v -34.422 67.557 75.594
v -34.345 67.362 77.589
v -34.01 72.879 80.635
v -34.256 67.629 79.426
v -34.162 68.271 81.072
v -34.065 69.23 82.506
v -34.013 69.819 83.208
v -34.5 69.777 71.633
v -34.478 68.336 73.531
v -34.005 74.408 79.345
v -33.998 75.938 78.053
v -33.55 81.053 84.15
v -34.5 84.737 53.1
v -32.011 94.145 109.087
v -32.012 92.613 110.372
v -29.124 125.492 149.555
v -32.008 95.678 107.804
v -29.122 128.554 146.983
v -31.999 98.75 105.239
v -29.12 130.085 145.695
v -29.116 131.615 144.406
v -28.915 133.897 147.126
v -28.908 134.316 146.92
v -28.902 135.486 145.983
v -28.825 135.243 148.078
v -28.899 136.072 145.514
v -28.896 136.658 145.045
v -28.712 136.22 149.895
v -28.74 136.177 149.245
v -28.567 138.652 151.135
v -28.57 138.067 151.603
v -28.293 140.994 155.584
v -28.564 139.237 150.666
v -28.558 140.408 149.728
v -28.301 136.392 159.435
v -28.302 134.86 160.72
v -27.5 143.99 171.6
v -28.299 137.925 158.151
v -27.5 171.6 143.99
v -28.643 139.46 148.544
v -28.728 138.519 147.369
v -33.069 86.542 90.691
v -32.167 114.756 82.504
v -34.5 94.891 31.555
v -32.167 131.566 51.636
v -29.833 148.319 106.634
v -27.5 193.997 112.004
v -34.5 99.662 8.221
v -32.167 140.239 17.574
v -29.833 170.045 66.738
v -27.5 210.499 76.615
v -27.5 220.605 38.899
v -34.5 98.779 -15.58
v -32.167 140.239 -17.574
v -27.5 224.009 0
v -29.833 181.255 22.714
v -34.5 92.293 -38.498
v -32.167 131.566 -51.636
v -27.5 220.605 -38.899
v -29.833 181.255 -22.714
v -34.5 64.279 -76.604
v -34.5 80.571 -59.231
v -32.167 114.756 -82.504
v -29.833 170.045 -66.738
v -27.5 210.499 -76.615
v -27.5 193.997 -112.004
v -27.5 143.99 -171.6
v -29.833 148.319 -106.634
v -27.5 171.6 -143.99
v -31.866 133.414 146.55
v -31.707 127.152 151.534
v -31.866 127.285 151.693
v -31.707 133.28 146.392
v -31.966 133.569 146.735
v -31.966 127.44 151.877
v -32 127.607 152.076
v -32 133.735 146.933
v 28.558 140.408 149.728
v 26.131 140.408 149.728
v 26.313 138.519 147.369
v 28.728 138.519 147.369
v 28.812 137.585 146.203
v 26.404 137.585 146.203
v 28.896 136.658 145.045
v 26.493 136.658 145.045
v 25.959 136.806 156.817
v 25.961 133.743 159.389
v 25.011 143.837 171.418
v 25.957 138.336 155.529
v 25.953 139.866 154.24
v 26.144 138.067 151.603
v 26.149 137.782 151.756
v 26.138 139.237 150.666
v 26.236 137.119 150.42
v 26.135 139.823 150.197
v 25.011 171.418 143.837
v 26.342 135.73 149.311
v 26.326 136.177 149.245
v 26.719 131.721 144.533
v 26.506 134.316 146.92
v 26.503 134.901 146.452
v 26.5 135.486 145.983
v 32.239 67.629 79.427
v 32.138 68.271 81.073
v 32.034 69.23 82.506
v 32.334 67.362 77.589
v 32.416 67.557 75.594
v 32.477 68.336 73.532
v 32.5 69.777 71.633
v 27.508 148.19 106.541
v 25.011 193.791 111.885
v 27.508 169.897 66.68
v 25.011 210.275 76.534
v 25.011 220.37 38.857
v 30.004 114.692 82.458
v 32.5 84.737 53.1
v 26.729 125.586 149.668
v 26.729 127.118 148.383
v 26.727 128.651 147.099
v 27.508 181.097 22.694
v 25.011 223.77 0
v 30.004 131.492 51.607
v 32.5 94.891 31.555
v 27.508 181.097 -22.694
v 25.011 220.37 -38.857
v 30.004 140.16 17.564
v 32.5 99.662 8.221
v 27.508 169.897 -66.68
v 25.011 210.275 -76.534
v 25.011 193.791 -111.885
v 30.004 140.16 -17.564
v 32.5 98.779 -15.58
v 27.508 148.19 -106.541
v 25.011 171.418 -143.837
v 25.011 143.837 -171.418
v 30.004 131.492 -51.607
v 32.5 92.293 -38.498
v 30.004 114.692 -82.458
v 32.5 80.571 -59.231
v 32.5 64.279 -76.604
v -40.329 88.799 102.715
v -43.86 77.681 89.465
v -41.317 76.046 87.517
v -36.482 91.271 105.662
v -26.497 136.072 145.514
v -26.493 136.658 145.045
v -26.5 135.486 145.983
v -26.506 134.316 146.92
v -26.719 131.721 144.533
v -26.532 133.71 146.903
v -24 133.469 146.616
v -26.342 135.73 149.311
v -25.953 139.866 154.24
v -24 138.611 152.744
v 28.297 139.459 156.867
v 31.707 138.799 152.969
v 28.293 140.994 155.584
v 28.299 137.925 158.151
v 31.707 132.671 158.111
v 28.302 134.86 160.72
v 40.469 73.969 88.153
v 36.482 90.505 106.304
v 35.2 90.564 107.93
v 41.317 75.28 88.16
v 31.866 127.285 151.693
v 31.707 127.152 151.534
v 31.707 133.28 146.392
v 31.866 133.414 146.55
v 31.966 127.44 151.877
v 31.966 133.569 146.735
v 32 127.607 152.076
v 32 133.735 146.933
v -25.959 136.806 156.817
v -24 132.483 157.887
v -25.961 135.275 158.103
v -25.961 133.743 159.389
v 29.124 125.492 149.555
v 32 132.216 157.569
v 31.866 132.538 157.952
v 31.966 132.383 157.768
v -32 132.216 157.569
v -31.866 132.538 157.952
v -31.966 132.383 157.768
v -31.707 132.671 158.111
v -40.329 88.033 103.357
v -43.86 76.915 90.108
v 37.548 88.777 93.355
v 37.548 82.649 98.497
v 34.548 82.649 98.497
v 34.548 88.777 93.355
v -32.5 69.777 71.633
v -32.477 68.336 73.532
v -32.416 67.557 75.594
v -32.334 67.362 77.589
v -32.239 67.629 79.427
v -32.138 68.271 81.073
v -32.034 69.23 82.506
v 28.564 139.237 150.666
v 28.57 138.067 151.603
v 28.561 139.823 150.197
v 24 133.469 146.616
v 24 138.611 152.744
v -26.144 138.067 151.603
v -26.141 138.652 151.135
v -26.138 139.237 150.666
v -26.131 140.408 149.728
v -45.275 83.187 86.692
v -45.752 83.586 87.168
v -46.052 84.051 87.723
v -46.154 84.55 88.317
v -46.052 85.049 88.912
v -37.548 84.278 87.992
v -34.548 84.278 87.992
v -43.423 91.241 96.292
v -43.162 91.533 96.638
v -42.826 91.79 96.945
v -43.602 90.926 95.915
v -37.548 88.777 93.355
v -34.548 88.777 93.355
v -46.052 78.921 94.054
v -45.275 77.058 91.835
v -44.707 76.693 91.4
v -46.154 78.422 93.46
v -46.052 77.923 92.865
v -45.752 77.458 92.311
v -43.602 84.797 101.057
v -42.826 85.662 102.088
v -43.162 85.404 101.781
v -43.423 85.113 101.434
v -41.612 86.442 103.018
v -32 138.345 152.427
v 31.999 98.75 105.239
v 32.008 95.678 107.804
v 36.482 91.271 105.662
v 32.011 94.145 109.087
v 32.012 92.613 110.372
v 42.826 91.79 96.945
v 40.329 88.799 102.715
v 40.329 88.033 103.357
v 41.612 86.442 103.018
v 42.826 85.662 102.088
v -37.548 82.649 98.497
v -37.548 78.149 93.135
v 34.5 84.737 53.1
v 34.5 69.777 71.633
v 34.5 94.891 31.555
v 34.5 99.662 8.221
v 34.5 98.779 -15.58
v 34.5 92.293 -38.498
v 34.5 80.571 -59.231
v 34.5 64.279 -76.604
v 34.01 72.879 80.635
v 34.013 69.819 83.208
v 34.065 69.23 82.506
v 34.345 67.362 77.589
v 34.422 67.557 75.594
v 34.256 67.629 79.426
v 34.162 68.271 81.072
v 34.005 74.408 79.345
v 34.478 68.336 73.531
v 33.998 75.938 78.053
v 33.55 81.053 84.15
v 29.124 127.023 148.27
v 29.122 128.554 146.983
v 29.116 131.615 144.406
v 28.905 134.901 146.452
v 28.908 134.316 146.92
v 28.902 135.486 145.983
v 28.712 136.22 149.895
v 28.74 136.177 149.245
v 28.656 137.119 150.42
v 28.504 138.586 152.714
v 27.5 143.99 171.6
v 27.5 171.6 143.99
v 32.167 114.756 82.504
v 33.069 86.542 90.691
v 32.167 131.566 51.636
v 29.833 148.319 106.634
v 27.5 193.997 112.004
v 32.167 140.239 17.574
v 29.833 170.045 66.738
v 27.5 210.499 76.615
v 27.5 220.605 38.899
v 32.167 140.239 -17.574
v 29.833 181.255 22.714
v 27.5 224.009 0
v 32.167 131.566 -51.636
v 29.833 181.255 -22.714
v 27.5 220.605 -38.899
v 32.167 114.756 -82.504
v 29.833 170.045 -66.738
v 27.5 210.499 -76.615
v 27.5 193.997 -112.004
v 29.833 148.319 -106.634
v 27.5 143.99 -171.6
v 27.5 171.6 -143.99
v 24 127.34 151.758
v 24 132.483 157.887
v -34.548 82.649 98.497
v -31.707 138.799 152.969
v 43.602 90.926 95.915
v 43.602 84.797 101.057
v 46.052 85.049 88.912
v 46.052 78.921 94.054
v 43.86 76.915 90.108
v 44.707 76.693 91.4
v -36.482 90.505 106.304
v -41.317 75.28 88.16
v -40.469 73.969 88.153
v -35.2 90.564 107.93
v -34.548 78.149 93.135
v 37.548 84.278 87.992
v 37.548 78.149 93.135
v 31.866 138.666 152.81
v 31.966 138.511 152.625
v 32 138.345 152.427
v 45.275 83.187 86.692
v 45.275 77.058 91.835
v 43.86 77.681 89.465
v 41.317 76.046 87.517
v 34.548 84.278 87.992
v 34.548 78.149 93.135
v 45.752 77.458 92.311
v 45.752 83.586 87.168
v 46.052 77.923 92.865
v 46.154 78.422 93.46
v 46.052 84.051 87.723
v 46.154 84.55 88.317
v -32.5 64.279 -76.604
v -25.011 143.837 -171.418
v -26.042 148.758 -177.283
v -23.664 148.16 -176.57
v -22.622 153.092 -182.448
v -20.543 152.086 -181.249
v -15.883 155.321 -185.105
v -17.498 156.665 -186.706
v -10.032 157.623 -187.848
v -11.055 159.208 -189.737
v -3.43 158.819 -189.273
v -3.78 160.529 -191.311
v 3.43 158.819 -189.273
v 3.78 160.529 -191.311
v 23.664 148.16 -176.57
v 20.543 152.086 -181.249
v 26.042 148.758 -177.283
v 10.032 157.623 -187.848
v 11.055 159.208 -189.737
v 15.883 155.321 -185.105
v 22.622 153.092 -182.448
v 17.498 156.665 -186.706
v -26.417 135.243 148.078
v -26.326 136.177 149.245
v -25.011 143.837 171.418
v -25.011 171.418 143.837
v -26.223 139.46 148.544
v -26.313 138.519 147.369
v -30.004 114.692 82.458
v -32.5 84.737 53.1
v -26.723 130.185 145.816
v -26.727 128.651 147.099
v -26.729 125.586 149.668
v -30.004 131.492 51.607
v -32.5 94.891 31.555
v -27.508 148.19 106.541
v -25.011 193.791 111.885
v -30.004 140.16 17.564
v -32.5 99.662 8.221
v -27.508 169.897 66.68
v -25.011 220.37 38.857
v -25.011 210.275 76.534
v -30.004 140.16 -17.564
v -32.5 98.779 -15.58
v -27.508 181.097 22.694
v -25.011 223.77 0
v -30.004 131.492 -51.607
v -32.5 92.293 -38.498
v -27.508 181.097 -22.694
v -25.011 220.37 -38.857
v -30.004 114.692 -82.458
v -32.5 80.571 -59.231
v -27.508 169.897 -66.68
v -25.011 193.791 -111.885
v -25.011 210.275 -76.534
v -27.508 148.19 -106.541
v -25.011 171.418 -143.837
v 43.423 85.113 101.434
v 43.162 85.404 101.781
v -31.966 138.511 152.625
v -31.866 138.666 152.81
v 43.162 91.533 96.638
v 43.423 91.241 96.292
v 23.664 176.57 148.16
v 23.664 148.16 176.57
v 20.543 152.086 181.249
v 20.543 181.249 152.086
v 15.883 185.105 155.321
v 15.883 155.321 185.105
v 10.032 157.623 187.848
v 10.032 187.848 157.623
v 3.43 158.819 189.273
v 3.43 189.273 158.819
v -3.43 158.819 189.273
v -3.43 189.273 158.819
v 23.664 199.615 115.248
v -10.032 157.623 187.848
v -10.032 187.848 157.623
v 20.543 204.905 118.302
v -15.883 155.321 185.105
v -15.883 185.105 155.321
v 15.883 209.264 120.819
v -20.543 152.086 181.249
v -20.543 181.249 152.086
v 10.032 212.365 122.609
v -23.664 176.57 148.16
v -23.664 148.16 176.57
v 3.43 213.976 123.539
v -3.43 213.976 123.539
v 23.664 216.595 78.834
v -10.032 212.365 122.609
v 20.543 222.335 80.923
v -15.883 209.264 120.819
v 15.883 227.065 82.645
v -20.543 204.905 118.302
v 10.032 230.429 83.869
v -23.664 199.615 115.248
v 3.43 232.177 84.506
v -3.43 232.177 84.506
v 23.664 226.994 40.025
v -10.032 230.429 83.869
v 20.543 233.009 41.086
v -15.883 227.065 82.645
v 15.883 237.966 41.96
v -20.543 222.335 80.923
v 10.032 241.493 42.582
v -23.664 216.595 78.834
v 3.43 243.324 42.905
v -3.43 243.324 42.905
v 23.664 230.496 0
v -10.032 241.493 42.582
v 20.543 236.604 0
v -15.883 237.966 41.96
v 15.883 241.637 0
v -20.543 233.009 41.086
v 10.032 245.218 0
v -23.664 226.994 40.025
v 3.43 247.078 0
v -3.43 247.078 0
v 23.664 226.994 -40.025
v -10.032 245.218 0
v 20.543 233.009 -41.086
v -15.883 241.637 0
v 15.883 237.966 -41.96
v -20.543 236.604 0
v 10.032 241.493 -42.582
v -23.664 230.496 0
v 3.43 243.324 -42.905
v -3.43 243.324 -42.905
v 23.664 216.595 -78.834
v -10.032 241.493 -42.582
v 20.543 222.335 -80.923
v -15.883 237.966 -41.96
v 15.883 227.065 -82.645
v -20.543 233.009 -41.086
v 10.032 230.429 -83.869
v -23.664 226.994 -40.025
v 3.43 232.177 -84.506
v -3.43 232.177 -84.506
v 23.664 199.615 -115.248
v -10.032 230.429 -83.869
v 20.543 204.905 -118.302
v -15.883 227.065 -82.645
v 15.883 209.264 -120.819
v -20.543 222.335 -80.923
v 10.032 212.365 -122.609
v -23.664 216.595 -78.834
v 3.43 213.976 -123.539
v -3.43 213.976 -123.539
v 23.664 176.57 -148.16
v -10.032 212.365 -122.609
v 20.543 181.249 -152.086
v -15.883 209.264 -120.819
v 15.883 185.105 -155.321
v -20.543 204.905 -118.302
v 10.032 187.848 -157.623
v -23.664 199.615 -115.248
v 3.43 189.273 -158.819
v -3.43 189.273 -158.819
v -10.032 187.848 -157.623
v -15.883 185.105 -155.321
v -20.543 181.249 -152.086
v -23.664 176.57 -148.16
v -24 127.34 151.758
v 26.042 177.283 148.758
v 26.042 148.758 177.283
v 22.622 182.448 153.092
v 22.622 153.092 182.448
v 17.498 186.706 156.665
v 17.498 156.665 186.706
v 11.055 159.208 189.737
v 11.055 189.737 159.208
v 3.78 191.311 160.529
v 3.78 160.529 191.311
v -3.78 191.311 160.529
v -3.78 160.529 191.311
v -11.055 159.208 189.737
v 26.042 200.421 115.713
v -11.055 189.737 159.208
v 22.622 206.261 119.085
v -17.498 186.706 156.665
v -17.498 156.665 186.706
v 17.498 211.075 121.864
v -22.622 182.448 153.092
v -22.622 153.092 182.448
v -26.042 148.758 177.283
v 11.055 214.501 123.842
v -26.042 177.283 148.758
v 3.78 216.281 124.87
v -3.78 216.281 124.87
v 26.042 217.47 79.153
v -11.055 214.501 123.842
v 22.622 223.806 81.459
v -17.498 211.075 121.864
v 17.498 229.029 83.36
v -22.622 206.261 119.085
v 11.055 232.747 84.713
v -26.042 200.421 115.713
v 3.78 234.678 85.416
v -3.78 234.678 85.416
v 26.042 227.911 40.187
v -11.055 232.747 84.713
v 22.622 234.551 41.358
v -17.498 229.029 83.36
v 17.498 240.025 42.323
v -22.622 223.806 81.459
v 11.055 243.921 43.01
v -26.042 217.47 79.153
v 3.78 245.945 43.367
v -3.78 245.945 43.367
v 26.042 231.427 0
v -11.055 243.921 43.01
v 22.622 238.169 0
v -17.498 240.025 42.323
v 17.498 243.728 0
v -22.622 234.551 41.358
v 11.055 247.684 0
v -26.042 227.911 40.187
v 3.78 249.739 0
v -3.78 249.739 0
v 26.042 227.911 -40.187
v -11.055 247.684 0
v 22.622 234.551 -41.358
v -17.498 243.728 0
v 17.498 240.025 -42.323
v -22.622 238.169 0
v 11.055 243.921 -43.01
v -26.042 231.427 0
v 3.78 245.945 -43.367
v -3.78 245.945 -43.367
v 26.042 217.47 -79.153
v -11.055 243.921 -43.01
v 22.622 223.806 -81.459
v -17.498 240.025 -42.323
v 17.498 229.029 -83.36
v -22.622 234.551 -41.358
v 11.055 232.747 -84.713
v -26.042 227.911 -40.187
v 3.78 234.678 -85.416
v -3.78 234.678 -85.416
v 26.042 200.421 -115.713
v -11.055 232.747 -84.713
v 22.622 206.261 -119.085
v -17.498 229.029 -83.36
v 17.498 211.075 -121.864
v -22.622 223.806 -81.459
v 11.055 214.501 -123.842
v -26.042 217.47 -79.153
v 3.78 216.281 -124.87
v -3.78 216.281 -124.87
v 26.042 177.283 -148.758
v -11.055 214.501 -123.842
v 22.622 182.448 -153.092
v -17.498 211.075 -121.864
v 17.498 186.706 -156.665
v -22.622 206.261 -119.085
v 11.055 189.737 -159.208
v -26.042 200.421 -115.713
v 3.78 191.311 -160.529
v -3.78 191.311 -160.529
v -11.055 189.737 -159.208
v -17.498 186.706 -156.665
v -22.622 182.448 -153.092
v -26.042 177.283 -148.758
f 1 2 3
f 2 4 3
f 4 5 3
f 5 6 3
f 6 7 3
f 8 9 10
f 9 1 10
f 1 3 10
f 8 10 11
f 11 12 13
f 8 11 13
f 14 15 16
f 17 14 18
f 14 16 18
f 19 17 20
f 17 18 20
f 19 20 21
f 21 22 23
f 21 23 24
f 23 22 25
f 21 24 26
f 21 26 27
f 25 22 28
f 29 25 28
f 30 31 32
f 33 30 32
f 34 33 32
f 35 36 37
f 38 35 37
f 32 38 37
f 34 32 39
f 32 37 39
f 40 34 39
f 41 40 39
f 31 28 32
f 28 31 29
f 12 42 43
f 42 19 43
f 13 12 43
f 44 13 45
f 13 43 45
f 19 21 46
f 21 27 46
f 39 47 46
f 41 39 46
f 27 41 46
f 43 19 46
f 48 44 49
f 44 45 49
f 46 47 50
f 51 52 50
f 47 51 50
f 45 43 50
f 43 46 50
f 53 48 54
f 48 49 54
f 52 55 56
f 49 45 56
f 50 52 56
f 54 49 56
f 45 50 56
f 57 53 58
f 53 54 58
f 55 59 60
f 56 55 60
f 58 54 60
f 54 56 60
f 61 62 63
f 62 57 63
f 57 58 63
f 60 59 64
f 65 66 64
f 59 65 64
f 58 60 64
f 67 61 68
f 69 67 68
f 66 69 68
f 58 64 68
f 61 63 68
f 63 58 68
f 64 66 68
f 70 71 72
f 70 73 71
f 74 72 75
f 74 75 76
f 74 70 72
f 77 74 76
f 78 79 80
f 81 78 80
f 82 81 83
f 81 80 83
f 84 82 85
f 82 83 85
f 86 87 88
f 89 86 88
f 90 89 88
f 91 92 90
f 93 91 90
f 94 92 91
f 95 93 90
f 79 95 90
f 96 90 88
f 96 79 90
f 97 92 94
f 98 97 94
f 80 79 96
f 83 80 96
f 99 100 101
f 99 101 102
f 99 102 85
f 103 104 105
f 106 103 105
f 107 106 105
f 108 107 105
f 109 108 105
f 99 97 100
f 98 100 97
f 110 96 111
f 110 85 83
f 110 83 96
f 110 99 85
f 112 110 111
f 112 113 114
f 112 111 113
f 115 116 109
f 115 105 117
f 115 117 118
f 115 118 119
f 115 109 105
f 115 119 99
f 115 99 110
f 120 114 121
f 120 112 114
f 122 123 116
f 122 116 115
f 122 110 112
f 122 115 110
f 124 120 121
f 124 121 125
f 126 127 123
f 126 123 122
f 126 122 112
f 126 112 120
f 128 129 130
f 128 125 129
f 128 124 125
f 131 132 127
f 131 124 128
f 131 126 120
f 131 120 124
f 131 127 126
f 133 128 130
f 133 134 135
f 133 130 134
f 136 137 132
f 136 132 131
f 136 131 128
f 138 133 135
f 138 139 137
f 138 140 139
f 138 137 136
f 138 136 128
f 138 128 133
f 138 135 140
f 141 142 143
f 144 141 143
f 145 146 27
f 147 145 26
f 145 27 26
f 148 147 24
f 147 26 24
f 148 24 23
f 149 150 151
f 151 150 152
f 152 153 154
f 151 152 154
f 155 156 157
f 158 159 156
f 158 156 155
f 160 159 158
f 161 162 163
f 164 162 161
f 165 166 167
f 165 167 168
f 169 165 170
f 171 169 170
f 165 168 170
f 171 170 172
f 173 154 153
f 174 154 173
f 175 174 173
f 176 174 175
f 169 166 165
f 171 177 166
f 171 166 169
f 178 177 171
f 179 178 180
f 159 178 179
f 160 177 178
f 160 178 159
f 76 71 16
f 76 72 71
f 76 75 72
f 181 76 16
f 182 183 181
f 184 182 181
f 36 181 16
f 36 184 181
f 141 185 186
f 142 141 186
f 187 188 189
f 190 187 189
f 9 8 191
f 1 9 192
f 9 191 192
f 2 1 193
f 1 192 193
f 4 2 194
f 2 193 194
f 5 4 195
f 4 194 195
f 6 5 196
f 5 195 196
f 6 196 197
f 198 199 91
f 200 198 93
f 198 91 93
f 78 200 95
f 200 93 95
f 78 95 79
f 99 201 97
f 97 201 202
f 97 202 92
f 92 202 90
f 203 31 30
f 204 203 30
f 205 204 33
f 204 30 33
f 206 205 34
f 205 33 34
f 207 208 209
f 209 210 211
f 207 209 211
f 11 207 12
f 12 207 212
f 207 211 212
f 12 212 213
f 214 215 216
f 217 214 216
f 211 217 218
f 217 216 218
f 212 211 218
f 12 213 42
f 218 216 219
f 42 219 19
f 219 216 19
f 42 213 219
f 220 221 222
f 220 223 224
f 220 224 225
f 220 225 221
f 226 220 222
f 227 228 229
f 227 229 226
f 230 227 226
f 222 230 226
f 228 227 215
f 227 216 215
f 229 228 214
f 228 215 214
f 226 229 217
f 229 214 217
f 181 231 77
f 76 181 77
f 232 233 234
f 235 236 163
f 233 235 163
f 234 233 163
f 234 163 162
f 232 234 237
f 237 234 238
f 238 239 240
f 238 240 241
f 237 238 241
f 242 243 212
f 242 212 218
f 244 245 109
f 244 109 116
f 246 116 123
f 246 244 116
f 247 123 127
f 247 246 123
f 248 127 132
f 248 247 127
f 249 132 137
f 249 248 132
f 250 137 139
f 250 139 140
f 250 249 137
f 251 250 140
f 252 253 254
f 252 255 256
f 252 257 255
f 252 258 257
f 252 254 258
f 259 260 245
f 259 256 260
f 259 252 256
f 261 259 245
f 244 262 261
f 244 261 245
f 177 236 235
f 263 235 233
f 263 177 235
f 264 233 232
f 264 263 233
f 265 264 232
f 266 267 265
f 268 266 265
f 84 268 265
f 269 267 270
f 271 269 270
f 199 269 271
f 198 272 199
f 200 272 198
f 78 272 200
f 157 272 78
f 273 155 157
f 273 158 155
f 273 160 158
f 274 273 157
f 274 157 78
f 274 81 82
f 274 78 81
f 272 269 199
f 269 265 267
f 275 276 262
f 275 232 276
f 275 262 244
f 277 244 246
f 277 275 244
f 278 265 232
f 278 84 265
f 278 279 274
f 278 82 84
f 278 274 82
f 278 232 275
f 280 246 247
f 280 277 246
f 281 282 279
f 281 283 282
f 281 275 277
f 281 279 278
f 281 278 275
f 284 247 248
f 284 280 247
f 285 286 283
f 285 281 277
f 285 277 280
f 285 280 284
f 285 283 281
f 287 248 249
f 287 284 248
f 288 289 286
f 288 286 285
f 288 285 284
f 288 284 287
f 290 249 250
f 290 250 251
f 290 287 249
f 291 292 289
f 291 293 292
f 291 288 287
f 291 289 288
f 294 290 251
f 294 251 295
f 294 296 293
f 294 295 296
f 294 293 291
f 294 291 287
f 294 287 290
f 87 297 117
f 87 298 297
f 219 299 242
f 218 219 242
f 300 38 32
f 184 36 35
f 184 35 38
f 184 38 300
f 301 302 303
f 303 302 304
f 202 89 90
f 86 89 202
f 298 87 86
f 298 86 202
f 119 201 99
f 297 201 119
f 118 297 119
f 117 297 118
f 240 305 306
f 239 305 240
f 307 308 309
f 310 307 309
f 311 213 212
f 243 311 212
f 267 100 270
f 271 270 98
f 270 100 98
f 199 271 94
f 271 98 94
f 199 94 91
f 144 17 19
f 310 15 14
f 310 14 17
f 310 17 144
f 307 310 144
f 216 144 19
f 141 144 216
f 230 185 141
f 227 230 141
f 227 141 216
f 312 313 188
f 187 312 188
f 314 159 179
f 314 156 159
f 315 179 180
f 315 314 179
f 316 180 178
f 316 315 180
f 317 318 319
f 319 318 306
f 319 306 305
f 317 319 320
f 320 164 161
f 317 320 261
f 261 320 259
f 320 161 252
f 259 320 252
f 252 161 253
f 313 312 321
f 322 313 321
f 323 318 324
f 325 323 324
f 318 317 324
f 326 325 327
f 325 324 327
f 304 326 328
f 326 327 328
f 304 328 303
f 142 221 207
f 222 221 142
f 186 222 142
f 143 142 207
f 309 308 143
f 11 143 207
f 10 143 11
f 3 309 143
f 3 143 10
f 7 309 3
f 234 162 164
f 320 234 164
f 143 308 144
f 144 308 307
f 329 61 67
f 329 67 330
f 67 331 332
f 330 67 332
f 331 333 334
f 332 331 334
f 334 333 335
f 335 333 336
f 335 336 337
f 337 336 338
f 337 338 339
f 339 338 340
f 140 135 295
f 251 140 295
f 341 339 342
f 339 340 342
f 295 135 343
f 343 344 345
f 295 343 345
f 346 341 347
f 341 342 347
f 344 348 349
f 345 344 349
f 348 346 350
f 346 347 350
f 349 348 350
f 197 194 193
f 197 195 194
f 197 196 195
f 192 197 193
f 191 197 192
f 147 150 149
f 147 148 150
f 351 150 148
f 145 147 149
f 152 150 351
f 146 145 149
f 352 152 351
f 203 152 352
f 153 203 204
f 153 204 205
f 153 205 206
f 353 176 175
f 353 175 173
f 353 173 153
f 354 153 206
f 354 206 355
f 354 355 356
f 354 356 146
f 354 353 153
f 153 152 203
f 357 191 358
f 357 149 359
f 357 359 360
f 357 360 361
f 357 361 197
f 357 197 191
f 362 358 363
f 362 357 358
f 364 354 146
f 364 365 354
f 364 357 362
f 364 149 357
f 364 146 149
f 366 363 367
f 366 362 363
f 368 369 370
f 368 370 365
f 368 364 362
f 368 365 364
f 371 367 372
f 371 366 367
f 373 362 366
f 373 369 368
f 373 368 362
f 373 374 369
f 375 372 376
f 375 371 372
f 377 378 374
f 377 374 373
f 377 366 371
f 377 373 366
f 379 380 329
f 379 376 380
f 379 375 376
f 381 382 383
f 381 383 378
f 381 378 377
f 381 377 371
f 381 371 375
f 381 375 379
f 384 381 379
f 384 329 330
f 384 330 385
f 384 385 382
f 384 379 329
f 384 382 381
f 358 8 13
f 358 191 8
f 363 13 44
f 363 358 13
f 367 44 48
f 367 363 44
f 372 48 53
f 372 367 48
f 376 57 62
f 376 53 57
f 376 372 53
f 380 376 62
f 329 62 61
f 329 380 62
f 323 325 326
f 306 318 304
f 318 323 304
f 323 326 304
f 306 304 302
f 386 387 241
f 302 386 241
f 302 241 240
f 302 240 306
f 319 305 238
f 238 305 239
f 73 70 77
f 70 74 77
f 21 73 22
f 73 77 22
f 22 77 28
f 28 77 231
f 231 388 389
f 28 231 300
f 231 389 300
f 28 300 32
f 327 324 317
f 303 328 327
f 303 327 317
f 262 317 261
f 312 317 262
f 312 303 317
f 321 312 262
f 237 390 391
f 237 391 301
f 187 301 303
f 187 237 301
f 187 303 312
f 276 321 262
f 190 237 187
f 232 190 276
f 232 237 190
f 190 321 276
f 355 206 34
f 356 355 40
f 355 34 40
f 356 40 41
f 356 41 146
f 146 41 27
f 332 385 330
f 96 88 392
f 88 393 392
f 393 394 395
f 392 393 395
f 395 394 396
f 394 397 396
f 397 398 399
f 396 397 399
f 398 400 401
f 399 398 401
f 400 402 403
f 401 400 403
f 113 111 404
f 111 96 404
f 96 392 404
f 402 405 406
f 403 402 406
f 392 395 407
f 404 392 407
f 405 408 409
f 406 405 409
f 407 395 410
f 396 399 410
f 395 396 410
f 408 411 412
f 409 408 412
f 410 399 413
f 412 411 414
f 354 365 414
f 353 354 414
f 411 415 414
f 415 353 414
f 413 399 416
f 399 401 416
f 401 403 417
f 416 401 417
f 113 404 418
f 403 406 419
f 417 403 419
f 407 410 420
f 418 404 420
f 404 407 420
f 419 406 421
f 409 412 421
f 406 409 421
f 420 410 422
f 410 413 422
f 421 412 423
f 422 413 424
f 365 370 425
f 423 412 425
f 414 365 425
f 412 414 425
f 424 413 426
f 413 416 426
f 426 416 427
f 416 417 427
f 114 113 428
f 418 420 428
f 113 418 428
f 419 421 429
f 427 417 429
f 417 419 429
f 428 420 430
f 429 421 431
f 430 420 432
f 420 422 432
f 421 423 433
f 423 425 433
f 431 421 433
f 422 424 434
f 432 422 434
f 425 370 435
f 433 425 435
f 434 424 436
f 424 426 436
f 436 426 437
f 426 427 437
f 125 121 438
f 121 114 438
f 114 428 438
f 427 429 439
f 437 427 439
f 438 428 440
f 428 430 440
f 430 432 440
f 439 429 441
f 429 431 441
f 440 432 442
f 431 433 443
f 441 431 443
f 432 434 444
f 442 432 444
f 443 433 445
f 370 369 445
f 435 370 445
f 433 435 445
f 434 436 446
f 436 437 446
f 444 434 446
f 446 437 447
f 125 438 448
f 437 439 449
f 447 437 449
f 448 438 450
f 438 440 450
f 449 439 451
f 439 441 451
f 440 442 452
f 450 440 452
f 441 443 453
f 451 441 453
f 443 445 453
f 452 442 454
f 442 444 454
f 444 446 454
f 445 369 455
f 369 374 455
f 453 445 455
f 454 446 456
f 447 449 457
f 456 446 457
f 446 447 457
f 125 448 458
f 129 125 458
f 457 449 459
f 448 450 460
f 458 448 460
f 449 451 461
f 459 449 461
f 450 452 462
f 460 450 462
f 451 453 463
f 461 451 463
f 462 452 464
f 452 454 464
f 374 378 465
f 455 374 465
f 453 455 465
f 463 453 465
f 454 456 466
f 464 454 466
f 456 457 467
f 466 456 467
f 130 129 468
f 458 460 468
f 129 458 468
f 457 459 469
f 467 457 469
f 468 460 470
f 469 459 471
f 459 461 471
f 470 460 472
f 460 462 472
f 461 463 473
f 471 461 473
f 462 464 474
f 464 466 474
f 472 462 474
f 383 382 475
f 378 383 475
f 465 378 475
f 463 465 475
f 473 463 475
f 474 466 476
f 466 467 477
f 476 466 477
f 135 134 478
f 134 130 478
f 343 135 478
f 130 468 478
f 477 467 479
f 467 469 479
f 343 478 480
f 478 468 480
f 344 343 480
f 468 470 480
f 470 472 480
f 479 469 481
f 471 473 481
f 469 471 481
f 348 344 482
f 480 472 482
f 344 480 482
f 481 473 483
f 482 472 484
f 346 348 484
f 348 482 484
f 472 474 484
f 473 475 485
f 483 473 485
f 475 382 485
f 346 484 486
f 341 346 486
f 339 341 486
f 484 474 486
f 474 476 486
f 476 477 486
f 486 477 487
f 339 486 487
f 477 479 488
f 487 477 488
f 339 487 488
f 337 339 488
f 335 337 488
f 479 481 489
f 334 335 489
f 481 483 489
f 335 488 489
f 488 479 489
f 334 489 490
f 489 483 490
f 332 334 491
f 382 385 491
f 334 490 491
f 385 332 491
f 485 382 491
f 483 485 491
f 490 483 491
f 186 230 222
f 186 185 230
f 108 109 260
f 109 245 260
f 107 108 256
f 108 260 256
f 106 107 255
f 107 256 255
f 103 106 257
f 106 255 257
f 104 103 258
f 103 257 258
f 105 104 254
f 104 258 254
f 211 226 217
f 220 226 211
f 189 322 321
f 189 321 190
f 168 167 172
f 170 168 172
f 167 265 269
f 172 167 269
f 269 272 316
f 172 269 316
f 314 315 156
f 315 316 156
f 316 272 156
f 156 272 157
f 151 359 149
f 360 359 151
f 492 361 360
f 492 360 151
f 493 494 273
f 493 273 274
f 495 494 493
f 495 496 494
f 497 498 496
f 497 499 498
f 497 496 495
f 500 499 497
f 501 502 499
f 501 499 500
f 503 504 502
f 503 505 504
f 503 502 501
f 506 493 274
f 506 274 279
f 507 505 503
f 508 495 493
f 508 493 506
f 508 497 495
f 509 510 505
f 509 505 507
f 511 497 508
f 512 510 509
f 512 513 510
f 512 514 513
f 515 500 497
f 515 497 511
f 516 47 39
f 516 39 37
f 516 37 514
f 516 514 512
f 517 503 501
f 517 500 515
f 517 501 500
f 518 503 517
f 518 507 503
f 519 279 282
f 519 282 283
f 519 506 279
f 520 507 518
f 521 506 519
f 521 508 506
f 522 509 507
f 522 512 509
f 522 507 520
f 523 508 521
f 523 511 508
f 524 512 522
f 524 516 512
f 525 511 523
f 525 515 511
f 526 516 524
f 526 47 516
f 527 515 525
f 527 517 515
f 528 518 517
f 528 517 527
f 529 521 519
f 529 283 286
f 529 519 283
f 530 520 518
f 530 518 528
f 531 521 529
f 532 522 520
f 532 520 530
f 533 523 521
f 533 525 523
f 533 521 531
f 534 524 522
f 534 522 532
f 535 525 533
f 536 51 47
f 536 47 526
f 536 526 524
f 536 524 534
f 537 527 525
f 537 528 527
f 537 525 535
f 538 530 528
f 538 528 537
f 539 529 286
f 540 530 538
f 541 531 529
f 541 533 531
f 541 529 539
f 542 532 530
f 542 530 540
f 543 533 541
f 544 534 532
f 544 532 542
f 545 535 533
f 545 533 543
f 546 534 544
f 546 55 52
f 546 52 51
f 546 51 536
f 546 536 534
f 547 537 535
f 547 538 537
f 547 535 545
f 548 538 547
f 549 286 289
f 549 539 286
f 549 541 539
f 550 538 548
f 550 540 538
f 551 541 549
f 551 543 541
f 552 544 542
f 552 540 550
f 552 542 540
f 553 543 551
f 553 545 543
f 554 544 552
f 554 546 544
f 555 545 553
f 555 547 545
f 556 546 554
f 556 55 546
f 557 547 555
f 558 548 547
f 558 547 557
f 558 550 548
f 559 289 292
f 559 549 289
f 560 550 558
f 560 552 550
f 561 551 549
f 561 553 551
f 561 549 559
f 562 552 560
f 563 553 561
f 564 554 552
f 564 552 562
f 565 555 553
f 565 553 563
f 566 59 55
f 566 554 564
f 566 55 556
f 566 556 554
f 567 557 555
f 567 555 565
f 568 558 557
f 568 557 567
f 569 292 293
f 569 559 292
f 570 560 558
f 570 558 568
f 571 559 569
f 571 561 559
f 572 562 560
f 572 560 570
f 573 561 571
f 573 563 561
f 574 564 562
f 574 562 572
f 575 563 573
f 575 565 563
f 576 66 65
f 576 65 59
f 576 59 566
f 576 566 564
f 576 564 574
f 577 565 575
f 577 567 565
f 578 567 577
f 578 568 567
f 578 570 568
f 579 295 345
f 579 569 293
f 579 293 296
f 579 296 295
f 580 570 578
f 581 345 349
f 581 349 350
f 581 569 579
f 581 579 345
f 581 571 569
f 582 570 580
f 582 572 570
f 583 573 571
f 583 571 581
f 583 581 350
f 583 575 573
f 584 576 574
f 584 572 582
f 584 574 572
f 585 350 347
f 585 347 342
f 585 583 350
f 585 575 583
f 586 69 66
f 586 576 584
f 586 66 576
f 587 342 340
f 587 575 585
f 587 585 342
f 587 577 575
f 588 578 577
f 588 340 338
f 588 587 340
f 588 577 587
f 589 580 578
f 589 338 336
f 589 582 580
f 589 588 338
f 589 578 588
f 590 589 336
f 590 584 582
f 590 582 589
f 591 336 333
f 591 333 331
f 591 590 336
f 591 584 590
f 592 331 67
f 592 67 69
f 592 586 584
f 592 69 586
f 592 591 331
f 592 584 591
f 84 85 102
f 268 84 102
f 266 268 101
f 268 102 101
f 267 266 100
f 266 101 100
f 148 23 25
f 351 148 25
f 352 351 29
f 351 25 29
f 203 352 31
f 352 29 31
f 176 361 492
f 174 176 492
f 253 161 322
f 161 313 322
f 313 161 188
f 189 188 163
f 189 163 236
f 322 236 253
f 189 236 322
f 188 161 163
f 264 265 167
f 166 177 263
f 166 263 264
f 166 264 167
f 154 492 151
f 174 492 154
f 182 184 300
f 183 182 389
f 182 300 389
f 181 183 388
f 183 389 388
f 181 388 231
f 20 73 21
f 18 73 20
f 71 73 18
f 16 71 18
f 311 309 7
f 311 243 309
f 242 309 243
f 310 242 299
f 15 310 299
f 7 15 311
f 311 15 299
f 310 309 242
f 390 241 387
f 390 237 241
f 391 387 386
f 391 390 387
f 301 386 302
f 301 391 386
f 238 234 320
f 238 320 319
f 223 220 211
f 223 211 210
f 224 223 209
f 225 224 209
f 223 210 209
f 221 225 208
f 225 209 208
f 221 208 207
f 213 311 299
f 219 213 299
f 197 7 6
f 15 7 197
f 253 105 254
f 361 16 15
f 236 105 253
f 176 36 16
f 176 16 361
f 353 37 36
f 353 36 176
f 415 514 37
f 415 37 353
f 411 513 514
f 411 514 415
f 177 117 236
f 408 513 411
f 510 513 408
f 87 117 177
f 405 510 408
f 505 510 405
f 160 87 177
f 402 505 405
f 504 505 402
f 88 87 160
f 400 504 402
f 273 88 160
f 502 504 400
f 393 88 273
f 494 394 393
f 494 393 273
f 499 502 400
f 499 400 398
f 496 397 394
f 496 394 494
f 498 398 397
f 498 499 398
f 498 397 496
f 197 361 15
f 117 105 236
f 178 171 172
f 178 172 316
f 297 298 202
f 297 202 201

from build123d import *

# Parameters (mm, degrees)
REVOLUTION_ANGLE = 100
FILLET_R         = 8
PAD_DEPTH        = 8
POCKET_DEPTH     = 2
CHAMFER_SIZE     = 1
SKETCH005_W      = 3
SKETCH005_H      = 7
POCKET001_DEPTH  = 81.8615815525
POCKET002_DEPTH  = 78.501
FILLET001_R      = 3
FILLET002_R      = 1


with BuildPart() as part:
    # Sketch → Revolution (revolve, symmetric)
    with BuildSketch(Plane.XY) as revolution_sk:
        with BuildLine():
            ThreePointArc((27.5, 224.008535095), (0, 250), (-27.5, 224.008535095))
            Line((-34.5, 100), (-27.5, 224.008535095))
            Line((-34.5, 100), (-32.5, 100))
            Line((-32.5, 100), (-25.0114058168, 223.77))
            ThreePointArc((25.0114058168, 223.77), (0, 247.3138512729), (-25.0114058168, 223.77))
            Line((25.0114058168, 223.77), (32.5, 100))
            Line((32.5, 100), (34.5, 100))
            Line((34.5, 100), (27.5, 224.008535095))
        make_face()
    revolve(axis=Axis((0, 0, 0), (1, 0, 0)), revolution_arc=REVOLUTION_ANGLE / 2)
    revolve(revolution_sk.sketch, axis=Axis((0, 0, 0), (-1, 0, 0)), revolution_arc=REVOLUTION_ANGLE / 2)

    # Fillet
    fillet_edges = [part.edges().sort_by_distance(p)[0] for p in [
        (33.5, 64.278761, 76.604444),
        (-33.5, 64.278761, 76.604444),
    ]]
    fillet(fillet_edges, radius=FILLET_R)

    # Sketch002 (on Face5 of Fillet) → Pad (new body)
    with BuildSketch(Plane(origin=(0, 0, 0), x_dir=(1, 0, 0), z_dir=(0, -0.7660444431, 0.6427876097))):
        Polygon((-43.3941714588, 132.6975053664), (-46.5, 121.1063954509), (-33.2488189206, 107.8552143715), (-31, 145.091676825), align=None)
        Polygon((43.3941714588, 132.6975053664), (46.5, 121.1063954509), (33.2488189206, 107.8552143715), (31, 145.091676825), align=None)
        Polygon((28, 194.1063954509), (32, 198.1063954509), (32, 206.1063954509), (28, 210.1063954509), (24, 206.1063954509), (24, 198.1063954509), align=None)
        Polygon((-28, 194.1063954509), (-24, 198.1063954509), (-24, 206.1063954509), (-28, 210.1063954509), (-32, 206.1063954509), (-32, 198.1063954509), align=None)
    extrude(amount=-PAD_DEPTH)

    # Sketch003 (on Face47 of Pad) → Pocket (cut)
    with BuildSketch(Plane(origin=(0, 0, 0), x_dir=(1, 0, 0), z_dir=(0, -0.7660444431, 0.6427876097))):
        Polygon((35, 146.8697948557), (45, 97.88), (47.9393876913, 98.48), (37.9393876913, 147.4697948557), align=None)
        Polygon((-47.9393876913, 98.4800000001), (-45, 97.88), (-35, 146.8697948557), (-37.9393876913, 147.4697948558), align=None)
    extrude(amount=-POCKET_DEPTH, mode=Mode.SUBTRACT)

    # Chamfer
    chamfer_edges = [part.edges().sort_by_distance(p)[0] for p in [
        (42.094426, 81.707526, 97.375238),
        (38.89944, 82.126736, 97.874832),
        (-38.89944, 82.126736, 97.874832),
        (-42.094426, 81.707526, 97.375238),
    ]]
    chamfer(chamfer_edges, length=CHAMFER_SIZE)

    # Sketch005 (on Face6 of Chamfer) → Pocket001 (cut, through all)
    with BuildSketch(Plane(origin=(0, 6.128355545, -5.1423008775), x_dir=(-1, 0, 0), z_dir=(0, 0.7660444431, -0.6427876097))):
        with Locations((-36.0477122259, 125.0785244639)):
            Rectangle(SKETCH005_W, SKETCH005_H)
        with Locations((36.0477122259, 125.0785244639)):
            Rectangle(SKETCH005_W, SKETCH005_H)
    extrude(amount=-POCKET001_DEPTH, mode=Mode.SUBTRACT)

    # Sketch006 (on Face54 of Pocket001) → Pocket002 (cut, through all)
    with BuildSketch(Plane(origin=(-32, 0, 0), x_dir=(0, -1, 0), z_dir=(-1, 0, 0))):
        Polygon((-140.4082247347, 149.7281591854), (-136.6575524936, 145.0449489894), (-134.3159473956, 146.92028511), (-138.0666196367, 151.6034953059), align=None)
    extrude(amount=-POCKET002_DEPTH, mode=Mode.SUBTRACT)

    # Fillet001
    fillet001_edges = [part.edges().sort_by_distance(p)[0] for p in [
        (46.5, 80.909868, 90.201731),
        (43.394171, 88.36049, 99.081036),
        (-43.394171, 88.36049, 99.081036),
        (-46.5, 80.909868, 90.201731),
    ]]
    fillet(fillet001_edges, radius=FILLET001_R)

    # Fillet002
    fillet002_edges = [part.edges().sort_by_distance(p)[0] for p in [
        (32, 135.546815, 155.315508),
        (32, 130.404514, 149.187153),
        (-32, 130.404514, 149.187153),
        (-32, 135.546815, 155.315508),
    ]]
    fillet(fillet002_edges, radius=FILLET002_R)


solid = part.part
